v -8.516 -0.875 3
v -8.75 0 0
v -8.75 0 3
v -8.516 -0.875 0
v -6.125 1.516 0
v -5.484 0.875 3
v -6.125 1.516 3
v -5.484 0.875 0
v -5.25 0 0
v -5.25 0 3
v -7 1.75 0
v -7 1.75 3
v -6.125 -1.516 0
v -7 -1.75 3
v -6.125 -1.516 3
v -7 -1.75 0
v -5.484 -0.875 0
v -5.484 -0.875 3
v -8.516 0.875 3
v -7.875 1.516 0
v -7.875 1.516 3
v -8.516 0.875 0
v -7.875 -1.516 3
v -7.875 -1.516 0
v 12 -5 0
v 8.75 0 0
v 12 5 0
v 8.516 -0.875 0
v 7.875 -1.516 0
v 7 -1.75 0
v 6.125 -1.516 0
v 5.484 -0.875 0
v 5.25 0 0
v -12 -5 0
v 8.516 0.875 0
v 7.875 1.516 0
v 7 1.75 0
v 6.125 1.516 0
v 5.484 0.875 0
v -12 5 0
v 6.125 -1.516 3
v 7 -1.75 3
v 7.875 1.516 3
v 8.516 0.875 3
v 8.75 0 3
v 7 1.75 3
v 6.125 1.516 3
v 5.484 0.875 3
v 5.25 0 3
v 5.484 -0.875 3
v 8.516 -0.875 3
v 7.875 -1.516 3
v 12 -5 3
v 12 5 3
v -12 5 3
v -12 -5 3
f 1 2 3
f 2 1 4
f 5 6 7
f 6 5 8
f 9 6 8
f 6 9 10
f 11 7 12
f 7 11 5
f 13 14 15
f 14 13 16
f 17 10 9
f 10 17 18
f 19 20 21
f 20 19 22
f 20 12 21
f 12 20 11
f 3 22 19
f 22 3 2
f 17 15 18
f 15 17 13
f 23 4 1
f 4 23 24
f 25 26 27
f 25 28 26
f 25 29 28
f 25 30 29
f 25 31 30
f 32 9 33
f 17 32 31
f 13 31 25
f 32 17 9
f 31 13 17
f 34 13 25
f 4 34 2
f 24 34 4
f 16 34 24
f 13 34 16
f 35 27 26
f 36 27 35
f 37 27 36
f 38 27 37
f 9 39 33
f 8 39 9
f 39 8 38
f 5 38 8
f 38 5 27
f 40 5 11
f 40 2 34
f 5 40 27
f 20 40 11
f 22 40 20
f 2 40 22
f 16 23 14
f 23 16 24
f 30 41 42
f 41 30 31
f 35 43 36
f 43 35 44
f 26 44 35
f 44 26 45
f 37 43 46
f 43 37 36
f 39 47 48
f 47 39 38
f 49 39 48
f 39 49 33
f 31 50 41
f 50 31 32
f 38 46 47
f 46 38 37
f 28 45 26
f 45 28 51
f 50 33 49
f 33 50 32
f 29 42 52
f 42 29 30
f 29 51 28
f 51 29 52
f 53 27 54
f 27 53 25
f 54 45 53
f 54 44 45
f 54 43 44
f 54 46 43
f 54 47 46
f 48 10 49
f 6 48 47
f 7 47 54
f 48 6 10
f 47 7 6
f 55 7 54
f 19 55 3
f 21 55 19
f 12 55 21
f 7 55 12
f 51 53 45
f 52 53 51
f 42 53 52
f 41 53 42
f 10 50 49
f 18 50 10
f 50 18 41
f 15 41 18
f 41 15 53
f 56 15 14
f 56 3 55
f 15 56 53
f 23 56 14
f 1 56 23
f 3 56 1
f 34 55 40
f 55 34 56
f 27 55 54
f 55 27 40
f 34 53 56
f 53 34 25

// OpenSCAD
difference()
{
    union()
    {
        translate([-(14+10)/2,-10/2,0])
            cube([14+10,10,3]);
        
    }
    union()
    {
        translate([-7,0,0])
            cylinder(d=3.5,h=5,$fn=12);
        translate([7,0,0])
            cylinder(d=3.5,h=5,$fn=12);
    }
}
